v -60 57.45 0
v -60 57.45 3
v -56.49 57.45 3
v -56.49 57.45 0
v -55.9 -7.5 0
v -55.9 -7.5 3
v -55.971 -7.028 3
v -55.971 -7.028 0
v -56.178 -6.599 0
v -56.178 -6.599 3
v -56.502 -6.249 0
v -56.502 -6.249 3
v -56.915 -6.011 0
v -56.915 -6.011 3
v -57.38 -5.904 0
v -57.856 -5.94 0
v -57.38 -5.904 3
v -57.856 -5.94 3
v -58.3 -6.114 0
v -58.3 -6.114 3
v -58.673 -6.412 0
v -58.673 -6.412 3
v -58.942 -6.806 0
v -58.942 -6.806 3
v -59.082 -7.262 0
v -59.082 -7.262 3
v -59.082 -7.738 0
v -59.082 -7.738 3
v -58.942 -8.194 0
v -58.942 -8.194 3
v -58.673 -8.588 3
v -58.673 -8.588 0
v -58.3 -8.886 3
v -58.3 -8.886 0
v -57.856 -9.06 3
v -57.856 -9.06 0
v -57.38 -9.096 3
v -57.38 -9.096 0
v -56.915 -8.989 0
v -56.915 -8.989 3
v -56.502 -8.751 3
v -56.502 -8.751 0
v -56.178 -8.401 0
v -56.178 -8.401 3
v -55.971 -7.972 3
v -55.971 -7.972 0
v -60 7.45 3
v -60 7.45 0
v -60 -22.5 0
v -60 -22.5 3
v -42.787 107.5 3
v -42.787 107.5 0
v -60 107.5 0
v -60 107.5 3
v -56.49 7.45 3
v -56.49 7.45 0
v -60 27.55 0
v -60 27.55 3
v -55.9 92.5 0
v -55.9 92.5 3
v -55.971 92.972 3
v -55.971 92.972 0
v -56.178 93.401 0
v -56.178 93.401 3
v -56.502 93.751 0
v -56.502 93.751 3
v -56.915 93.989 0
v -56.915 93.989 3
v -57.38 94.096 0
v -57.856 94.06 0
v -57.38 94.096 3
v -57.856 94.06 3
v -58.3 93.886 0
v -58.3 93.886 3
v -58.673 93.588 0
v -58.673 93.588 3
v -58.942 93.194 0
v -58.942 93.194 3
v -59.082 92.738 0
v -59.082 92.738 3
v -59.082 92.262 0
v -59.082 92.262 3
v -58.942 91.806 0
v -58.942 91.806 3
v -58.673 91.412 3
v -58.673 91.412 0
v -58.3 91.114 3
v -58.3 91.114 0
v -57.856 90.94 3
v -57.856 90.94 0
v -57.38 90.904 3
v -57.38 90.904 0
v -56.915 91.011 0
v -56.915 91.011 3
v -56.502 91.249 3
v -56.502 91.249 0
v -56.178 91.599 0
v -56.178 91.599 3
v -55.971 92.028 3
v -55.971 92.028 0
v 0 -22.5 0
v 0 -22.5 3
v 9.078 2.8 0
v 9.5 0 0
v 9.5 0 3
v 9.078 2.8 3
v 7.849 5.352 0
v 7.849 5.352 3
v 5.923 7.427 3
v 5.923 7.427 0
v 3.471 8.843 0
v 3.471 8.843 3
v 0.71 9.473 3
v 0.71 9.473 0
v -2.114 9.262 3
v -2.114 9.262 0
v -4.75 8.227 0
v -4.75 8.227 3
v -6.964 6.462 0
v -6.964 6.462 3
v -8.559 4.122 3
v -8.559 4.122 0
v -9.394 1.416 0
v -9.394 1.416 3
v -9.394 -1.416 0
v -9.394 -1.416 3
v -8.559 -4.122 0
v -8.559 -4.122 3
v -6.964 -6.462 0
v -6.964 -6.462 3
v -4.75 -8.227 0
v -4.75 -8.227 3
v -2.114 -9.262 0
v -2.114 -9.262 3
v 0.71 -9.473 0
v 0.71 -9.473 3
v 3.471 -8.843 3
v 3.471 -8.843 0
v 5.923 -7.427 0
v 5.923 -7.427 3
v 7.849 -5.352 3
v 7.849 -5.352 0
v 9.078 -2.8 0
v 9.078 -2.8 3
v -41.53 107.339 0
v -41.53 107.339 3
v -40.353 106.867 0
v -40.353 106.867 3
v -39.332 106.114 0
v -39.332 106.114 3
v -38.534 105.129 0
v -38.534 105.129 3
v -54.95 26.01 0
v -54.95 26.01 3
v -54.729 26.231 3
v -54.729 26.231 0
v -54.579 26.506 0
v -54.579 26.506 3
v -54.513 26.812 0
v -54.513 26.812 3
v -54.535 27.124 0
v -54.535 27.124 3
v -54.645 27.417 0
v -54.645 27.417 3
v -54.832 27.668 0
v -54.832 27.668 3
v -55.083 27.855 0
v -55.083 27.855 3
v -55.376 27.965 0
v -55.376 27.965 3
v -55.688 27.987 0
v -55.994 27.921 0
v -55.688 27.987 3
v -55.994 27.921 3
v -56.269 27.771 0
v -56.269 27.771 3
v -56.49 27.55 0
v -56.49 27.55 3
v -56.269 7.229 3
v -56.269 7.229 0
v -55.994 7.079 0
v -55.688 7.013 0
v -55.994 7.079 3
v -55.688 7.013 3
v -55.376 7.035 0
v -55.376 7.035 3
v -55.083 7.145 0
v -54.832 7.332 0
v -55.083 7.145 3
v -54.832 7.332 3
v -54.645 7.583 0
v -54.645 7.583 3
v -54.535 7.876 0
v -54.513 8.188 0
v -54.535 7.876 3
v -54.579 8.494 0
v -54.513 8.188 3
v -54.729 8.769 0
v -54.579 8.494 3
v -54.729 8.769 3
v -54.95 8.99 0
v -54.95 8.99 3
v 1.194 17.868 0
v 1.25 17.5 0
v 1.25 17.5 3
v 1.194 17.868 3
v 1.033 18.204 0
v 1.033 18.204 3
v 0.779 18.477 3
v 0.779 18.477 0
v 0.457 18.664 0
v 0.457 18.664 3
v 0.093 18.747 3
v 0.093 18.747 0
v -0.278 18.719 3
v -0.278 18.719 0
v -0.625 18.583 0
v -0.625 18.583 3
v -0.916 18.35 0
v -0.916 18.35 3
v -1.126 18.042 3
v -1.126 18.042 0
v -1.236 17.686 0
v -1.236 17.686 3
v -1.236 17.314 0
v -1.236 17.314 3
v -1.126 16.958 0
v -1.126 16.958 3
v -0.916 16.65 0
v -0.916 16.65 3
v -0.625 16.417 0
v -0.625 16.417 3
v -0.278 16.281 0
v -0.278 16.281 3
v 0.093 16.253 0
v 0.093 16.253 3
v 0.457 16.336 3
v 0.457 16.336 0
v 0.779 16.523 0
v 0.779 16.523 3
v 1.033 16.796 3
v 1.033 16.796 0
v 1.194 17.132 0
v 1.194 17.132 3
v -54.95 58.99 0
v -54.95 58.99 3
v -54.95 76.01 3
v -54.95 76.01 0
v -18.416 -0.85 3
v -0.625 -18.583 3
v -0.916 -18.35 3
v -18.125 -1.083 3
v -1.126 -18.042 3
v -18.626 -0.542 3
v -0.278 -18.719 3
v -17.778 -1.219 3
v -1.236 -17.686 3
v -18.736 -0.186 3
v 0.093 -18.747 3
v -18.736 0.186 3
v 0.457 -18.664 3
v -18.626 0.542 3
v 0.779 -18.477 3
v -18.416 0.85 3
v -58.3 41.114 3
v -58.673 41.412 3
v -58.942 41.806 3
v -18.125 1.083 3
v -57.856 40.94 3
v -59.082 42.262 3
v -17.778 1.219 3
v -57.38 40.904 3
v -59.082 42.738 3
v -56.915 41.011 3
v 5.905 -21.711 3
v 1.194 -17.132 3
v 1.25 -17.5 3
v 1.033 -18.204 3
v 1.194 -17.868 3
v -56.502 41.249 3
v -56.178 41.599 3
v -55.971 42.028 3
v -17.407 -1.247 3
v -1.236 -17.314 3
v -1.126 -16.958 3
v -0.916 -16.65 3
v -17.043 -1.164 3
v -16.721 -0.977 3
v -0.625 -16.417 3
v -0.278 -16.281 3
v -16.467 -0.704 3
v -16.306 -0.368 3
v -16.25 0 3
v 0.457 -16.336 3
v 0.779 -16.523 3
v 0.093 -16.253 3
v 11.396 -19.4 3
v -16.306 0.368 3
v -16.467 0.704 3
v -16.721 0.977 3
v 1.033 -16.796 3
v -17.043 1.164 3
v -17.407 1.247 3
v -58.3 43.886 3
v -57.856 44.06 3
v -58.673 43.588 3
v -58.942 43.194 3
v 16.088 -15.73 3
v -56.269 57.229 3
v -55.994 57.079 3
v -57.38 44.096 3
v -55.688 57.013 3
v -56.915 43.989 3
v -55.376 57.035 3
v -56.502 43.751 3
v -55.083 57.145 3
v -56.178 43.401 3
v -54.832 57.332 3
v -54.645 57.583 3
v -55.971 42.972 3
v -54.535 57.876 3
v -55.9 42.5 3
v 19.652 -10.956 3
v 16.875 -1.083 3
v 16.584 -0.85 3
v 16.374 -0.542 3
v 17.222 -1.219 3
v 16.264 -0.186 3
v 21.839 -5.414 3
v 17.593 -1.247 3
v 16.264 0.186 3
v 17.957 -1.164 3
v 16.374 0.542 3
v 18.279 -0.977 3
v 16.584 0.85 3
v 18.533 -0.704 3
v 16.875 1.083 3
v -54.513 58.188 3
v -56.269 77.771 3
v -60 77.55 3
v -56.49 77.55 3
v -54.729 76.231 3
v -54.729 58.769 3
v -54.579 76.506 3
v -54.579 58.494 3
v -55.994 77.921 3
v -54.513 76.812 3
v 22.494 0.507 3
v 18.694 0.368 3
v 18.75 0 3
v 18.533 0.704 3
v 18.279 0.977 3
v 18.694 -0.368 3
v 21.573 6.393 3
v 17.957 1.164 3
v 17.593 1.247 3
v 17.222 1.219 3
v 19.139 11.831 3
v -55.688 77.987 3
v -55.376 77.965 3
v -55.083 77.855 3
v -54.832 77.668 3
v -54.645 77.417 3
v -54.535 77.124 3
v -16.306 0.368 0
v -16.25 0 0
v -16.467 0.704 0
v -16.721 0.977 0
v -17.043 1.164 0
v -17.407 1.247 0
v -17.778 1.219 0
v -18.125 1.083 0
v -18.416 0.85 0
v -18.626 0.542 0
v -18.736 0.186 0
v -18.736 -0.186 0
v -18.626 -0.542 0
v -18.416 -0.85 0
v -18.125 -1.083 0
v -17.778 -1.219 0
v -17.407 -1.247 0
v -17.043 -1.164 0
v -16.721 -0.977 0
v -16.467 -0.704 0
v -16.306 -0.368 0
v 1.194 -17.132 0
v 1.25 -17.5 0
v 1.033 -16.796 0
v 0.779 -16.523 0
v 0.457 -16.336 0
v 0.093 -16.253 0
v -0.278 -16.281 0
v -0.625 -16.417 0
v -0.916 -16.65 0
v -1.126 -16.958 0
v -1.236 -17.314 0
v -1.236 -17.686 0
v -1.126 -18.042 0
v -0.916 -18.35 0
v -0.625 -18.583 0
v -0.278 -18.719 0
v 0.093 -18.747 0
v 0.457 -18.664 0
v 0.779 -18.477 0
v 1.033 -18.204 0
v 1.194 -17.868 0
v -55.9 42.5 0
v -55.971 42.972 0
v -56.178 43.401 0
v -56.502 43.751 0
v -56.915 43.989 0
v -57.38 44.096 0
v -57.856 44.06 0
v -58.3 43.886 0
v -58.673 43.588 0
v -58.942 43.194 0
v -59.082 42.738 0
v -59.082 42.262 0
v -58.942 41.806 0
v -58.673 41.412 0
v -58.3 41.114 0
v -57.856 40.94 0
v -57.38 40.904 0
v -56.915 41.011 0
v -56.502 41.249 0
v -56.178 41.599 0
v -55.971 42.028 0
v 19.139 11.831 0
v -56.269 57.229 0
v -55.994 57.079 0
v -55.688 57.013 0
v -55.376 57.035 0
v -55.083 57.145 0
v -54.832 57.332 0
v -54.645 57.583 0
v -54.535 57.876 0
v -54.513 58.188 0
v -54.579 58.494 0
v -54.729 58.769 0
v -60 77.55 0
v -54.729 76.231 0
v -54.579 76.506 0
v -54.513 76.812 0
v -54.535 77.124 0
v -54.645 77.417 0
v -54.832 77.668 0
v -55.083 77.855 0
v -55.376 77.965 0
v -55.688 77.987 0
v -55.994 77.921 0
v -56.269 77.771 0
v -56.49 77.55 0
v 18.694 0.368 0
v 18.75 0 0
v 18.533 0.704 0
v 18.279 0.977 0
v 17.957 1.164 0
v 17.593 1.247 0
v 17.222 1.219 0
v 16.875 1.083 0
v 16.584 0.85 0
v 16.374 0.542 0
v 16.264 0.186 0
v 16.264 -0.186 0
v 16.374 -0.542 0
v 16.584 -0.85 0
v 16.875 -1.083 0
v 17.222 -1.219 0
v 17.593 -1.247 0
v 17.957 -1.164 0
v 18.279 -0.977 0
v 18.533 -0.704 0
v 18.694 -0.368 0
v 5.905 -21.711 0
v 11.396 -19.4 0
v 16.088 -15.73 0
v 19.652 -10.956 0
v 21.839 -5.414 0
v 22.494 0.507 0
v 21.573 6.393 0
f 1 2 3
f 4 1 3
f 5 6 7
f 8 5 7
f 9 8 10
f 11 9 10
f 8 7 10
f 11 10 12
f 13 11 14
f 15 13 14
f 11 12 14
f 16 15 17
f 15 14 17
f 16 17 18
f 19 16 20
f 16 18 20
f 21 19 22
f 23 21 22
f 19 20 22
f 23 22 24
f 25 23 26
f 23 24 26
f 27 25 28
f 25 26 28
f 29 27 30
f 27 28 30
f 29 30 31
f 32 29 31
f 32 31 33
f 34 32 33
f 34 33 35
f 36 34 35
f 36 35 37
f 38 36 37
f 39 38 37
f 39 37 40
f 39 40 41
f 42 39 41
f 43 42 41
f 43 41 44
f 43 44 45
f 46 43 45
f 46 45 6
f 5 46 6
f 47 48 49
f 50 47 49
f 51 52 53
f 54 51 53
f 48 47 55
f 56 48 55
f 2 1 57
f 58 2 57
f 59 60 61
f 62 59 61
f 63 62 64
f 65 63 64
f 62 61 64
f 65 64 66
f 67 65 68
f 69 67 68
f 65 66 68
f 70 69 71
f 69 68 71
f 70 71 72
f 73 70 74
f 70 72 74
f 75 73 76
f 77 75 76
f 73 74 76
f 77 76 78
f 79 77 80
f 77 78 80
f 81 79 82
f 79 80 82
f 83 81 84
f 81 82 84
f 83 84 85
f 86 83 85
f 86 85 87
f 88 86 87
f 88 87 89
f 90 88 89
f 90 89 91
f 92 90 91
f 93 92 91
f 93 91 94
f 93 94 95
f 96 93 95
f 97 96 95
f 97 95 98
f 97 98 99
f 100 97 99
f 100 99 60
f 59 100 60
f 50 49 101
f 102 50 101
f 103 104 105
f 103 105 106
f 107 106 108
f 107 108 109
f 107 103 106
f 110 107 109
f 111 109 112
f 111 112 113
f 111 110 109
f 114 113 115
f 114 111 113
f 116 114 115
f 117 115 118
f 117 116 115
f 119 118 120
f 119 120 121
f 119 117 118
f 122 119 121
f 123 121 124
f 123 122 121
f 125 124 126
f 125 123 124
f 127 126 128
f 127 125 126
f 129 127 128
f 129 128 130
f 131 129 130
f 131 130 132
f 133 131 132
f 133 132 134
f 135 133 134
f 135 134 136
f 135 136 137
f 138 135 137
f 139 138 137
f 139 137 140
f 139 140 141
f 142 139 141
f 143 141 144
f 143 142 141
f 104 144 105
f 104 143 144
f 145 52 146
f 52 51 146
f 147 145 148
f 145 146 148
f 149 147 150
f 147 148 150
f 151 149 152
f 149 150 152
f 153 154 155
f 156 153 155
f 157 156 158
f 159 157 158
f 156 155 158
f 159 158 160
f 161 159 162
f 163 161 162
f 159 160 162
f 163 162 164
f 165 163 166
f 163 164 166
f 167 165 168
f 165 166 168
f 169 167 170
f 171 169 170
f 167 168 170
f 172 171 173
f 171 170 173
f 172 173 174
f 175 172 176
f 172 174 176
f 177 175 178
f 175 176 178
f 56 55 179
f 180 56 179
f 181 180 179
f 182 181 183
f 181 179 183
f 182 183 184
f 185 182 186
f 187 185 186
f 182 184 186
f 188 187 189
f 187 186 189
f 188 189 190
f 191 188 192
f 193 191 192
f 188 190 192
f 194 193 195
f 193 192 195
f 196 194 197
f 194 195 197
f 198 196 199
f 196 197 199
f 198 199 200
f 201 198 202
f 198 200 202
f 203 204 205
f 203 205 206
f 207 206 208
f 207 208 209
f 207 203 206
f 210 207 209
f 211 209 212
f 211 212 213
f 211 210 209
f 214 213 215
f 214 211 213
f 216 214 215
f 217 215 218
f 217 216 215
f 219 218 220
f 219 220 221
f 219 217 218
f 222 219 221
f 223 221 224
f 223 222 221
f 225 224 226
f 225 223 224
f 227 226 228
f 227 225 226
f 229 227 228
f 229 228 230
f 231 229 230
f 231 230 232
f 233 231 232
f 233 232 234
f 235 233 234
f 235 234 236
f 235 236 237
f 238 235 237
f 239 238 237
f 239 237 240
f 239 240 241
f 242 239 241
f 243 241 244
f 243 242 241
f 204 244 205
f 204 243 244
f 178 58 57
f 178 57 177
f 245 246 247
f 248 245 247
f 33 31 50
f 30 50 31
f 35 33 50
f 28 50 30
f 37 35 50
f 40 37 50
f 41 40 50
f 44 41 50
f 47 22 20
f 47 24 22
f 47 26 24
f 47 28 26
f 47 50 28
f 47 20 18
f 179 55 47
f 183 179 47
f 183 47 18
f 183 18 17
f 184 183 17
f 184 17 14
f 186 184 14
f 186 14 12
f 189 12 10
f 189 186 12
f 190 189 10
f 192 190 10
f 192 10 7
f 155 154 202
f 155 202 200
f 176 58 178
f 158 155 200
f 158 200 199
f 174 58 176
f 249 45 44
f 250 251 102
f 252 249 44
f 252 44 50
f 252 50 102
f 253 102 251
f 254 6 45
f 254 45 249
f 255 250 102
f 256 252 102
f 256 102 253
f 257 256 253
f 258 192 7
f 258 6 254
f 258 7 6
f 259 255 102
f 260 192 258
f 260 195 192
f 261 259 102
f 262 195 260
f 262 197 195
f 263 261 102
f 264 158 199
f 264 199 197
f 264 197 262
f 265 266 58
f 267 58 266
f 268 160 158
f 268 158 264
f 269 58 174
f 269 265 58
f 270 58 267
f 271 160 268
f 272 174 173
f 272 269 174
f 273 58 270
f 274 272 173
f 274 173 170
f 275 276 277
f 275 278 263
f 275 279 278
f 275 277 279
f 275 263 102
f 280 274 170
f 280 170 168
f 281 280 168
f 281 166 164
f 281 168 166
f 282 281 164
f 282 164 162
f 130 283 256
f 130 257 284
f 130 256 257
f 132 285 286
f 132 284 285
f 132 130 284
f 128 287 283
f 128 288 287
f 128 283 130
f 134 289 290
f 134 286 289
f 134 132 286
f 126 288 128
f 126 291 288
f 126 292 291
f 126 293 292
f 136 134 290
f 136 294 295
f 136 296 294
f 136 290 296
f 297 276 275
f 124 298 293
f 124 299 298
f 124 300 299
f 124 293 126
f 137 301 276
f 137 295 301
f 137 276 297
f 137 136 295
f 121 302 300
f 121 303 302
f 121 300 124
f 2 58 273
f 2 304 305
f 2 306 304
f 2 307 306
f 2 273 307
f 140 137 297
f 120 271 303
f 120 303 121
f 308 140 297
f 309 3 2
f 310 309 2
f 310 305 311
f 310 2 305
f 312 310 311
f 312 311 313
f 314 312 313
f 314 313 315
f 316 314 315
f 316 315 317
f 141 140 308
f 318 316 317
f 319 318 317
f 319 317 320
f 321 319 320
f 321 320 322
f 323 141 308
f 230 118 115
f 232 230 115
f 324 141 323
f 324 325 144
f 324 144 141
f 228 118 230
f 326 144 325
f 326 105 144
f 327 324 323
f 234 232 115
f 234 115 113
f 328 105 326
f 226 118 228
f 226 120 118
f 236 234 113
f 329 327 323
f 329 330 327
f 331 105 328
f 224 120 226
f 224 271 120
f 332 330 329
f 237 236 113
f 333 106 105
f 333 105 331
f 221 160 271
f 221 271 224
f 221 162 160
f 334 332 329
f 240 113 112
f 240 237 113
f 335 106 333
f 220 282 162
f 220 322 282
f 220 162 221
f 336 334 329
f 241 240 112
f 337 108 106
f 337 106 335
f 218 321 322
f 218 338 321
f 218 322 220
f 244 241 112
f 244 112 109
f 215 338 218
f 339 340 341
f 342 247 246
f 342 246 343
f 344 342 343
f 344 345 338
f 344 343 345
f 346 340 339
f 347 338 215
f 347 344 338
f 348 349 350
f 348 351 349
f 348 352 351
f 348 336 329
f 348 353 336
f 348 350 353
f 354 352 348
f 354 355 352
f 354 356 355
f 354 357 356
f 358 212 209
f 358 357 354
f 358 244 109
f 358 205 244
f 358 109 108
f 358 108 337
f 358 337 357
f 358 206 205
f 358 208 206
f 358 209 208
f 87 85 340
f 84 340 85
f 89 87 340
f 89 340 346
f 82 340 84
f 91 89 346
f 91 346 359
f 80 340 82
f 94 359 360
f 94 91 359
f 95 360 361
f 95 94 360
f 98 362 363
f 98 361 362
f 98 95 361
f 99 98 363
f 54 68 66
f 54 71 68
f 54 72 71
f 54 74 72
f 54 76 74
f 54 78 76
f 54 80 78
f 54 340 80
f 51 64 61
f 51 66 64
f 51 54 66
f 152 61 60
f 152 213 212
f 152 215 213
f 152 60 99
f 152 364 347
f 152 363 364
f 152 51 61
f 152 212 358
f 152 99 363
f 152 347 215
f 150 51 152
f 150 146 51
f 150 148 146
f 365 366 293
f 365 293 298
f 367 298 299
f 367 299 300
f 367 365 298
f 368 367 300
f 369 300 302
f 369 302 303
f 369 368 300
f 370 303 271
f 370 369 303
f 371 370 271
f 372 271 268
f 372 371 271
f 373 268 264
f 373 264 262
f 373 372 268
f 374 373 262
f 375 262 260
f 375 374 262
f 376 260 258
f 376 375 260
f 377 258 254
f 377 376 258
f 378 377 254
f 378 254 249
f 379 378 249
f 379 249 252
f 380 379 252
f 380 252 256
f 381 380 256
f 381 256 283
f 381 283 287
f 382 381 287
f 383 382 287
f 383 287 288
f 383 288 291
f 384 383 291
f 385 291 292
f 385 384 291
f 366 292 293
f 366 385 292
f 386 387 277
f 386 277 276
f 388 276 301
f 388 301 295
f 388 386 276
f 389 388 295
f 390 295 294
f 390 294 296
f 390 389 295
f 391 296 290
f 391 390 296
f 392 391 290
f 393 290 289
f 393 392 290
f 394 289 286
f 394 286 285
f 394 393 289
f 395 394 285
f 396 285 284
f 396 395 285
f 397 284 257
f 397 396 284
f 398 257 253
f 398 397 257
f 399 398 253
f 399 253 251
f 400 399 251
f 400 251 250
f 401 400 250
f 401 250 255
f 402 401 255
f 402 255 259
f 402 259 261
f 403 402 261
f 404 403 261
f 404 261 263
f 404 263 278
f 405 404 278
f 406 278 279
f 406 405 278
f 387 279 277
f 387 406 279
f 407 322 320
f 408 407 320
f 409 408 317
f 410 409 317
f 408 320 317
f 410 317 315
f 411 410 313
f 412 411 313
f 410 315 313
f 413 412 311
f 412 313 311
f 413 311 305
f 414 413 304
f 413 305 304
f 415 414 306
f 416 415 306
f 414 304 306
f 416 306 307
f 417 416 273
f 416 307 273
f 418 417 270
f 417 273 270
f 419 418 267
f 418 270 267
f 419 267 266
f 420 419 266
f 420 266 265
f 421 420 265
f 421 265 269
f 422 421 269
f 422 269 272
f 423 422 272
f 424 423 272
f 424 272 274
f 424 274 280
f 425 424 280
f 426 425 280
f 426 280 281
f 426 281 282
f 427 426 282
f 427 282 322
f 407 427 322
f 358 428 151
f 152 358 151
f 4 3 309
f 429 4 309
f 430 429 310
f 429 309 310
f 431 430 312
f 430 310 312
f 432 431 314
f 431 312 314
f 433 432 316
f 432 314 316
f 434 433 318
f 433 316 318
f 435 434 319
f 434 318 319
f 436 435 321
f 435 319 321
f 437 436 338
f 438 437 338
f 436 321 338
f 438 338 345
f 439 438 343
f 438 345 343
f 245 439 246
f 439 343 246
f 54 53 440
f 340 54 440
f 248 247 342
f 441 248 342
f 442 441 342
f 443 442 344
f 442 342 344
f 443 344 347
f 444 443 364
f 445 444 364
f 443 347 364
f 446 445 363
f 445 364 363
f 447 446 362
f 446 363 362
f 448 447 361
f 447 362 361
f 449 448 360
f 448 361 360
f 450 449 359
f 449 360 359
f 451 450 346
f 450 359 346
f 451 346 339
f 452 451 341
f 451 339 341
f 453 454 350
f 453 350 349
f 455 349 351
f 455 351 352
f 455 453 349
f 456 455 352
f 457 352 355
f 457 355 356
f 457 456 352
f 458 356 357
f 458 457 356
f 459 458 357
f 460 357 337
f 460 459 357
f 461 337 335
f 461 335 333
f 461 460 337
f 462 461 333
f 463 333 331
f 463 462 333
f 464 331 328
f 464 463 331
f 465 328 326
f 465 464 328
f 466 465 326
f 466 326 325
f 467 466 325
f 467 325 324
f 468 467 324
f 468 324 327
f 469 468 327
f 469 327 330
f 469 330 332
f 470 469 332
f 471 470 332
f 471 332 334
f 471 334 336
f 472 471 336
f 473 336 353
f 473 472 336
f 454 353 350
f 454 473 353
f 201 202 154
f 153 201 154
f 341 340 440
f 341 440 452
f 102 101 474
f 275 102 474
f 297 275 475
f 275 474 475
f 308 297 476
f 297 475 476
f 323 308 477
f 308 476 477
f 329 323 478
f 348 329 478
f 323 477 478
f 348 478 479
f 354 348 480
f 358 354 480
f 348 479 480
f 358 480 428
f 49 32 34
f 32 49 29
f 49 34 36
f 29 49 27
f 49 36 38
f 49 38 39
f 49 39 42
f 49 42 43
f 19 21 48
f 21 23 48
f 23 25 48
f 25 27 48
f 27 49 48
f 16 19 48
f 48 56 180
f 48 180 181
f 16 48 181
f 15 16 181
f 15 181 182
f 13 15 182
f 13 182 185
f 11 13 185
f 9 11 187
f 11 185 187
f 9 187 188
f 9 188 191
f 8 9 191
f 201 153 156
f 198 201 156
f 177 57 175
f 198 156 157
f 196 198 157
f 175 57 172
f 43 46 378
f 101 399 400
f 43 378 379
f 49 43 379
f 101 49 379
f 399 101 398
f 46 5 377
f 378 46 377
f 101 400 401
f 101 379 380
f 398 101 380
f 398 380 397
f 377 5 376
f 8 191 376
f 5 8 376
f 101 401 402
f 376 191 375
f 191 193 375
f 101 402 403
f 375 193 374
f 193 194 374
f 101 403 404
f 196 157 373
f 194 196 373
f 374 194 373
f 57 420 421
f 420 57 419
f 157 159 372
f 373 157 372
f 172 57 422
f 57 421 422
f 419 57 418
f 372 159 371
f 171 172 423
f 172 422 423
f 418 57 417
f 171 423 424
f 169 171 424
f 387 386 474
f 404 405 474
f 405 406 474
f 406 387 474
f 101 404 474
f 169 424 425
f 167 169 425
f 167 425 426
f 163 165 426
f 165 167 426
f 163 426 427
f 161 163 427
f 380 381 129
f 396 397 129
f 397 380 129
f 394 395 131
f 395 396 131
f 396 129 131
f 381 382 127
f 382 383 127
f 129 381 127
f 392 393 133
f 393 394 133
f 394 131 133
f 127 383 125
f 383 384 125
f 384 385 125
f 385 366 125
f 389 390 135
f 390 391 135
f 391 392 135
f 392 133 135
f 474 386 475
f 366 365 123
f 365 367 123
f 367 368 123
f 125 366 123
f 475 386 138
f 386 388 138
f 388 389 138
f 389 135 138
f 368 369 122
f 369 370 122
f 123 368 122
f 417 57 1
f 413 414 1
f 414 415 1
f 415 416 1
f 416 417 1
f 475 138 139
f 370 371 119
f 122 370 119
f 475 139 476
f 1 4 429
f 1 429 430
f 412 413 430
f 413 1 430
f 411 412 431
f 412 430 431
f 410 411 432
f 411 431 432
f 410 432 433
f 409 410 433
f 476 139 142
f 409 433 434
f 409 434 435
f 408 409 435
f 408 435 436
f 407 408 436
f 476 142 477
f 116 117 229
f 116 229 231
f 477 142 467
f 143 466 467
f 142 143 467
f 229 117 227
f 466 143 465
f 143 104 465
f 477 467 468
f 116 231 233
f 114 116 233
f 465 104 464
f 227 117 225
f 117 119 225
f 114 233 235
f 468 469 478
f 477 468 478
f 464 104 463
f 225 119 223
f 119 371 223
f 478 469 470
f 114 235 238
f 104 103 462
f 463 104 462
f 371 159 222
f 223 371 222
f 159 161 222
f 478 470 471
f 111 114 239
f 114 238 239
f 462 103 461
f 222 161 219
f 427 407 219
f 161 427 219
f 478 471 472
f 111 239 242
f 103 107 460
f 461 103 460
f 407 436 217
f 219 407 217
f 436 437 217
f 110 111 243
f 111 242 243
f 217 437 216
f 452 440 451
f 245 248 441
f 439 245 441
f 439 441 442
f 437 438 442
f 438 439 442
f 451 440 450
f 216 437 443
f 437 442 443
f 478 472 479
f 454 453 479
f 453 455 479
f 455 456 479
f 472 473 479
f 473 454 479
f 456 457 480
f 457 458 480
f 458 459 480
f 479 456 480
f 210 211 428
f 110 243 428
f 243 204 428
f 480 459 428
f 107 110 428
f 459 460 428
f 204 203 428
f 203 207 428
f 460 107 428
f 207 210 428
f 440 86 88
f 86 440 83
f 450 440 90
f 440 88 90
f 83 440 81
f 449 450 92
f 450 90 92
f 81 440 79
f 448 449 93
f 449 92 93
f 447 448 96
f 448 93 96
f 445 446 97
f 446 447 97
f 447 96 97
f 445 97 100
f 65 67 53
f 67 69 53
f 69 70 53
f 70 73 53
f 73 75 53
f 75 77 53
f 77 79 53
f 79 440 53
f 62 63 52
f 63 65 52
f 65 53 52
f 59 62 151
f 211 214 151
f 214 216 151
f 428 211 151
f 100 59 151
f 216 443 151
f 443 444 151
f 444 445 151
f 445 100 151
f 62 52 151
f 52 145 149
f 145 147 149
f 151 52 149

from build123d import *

# Parameters (mm, degrees)
SKETCH_2_R          = 9.5
SKETCH_2_R_2        = 1.25
EXTRUDE_1_DEPTH     = 3
FILLET_3_R          = 5
SKETCH_4_R          = 1.6
SKETCH_4_R_2        = 1.1
SKETCH_4_W          = 5.05
SKETCH_4_H          = 20.1
CUT_EXTRUDE_1_DEPTH = 10


with BuildPart() as part:
    # ｽｹｯﾁ2 → ﾎﾞｽ - 押し出し1 (new body)
    with BuildSketch(Plane.XY):
        with BuildLine():
            Line((-60, 107.5), (-60, -22.5))
            Line((-60, -22.5), (-40, -22.5))
            Line((-40, -22.5), (0, -22.5))
            ThreePointArc((0, -22.5), (19.65247344, -10.9558335), (19.138597944, 11.830641096))
            Line((19.138597944, 11.830641096), (-40, 107.5))
            Line((-40, 107.5), (-60, 107.5))
        make_face()
        Circle(SKETCH_2_R, mode=Mode.SUBTRACT)
        with Locations((0, 17.5)):
            Circle(SKETCH_2_R_2, mode=Mode.SUBTRACT)
        with Locations((17.5, 0)):
            Circle(SKETCH_2_R_2, mode=Mode.SUBTRACT)
        with Locations((0, -17.5)):
            Circle(SKETCH_2_R_2, mode=Mode.SUBTRACT)
        with Locations((-17.5, 0)):
            Circle(SKETCH_2_R_2, mode=Mode.SUBTRACT)
    extrude(amount=EXTRUDE_1_DEPTH)

    # ﾌｨﾚｯﾄ3
    fillet_3_edges = [part.edges().sort_by_distance(p)[0] for p in [
        (-40, 107.5, 1.5),
    ]]
    fillet(fillet_3_edges, radius=FILLET_3_R)

    # ｽｹｯﾁ4 → ｶｯﾄ - 押し出し1 (cut)
    with BuildSketch(Plane.XY.offset(3)):
        with Locations((-57.5, -7.5)):
            Circle(SKETCH_4_R)
        with Locations((-57.5, 42.5)):
            Circle(SKETCH_4_R)
        with Locations((-57.5, 92.5)):
            Circle(SKETCH_4_R)
        with Locations((-55.61, 26.89)):
            Circle(SKETCH_4_R_2)
        with Locations((-55.61, 8.11)):
            Circle(SKETCH_4_R_2)
        with Locations((-55.61, 58.11)):
            Circle(SKETCH_4_R_2)
        with Locations((-55.61, 76.89)):
            Circle(SKETCH_4_R_2)
        with Locations((-57.475, 67.5)):
            Rectangle(SKETCH_4_W, SKETCH_4_H)
        with Locations((-57.475, 17.5)):
            Rectangle(SKETCH_4_W, SKETCH_4_H)
    extrude(amount=-CUT_EXTRUDE_1_DEPTH, mode=Mode.SUBTRACT)


solid = part.part
